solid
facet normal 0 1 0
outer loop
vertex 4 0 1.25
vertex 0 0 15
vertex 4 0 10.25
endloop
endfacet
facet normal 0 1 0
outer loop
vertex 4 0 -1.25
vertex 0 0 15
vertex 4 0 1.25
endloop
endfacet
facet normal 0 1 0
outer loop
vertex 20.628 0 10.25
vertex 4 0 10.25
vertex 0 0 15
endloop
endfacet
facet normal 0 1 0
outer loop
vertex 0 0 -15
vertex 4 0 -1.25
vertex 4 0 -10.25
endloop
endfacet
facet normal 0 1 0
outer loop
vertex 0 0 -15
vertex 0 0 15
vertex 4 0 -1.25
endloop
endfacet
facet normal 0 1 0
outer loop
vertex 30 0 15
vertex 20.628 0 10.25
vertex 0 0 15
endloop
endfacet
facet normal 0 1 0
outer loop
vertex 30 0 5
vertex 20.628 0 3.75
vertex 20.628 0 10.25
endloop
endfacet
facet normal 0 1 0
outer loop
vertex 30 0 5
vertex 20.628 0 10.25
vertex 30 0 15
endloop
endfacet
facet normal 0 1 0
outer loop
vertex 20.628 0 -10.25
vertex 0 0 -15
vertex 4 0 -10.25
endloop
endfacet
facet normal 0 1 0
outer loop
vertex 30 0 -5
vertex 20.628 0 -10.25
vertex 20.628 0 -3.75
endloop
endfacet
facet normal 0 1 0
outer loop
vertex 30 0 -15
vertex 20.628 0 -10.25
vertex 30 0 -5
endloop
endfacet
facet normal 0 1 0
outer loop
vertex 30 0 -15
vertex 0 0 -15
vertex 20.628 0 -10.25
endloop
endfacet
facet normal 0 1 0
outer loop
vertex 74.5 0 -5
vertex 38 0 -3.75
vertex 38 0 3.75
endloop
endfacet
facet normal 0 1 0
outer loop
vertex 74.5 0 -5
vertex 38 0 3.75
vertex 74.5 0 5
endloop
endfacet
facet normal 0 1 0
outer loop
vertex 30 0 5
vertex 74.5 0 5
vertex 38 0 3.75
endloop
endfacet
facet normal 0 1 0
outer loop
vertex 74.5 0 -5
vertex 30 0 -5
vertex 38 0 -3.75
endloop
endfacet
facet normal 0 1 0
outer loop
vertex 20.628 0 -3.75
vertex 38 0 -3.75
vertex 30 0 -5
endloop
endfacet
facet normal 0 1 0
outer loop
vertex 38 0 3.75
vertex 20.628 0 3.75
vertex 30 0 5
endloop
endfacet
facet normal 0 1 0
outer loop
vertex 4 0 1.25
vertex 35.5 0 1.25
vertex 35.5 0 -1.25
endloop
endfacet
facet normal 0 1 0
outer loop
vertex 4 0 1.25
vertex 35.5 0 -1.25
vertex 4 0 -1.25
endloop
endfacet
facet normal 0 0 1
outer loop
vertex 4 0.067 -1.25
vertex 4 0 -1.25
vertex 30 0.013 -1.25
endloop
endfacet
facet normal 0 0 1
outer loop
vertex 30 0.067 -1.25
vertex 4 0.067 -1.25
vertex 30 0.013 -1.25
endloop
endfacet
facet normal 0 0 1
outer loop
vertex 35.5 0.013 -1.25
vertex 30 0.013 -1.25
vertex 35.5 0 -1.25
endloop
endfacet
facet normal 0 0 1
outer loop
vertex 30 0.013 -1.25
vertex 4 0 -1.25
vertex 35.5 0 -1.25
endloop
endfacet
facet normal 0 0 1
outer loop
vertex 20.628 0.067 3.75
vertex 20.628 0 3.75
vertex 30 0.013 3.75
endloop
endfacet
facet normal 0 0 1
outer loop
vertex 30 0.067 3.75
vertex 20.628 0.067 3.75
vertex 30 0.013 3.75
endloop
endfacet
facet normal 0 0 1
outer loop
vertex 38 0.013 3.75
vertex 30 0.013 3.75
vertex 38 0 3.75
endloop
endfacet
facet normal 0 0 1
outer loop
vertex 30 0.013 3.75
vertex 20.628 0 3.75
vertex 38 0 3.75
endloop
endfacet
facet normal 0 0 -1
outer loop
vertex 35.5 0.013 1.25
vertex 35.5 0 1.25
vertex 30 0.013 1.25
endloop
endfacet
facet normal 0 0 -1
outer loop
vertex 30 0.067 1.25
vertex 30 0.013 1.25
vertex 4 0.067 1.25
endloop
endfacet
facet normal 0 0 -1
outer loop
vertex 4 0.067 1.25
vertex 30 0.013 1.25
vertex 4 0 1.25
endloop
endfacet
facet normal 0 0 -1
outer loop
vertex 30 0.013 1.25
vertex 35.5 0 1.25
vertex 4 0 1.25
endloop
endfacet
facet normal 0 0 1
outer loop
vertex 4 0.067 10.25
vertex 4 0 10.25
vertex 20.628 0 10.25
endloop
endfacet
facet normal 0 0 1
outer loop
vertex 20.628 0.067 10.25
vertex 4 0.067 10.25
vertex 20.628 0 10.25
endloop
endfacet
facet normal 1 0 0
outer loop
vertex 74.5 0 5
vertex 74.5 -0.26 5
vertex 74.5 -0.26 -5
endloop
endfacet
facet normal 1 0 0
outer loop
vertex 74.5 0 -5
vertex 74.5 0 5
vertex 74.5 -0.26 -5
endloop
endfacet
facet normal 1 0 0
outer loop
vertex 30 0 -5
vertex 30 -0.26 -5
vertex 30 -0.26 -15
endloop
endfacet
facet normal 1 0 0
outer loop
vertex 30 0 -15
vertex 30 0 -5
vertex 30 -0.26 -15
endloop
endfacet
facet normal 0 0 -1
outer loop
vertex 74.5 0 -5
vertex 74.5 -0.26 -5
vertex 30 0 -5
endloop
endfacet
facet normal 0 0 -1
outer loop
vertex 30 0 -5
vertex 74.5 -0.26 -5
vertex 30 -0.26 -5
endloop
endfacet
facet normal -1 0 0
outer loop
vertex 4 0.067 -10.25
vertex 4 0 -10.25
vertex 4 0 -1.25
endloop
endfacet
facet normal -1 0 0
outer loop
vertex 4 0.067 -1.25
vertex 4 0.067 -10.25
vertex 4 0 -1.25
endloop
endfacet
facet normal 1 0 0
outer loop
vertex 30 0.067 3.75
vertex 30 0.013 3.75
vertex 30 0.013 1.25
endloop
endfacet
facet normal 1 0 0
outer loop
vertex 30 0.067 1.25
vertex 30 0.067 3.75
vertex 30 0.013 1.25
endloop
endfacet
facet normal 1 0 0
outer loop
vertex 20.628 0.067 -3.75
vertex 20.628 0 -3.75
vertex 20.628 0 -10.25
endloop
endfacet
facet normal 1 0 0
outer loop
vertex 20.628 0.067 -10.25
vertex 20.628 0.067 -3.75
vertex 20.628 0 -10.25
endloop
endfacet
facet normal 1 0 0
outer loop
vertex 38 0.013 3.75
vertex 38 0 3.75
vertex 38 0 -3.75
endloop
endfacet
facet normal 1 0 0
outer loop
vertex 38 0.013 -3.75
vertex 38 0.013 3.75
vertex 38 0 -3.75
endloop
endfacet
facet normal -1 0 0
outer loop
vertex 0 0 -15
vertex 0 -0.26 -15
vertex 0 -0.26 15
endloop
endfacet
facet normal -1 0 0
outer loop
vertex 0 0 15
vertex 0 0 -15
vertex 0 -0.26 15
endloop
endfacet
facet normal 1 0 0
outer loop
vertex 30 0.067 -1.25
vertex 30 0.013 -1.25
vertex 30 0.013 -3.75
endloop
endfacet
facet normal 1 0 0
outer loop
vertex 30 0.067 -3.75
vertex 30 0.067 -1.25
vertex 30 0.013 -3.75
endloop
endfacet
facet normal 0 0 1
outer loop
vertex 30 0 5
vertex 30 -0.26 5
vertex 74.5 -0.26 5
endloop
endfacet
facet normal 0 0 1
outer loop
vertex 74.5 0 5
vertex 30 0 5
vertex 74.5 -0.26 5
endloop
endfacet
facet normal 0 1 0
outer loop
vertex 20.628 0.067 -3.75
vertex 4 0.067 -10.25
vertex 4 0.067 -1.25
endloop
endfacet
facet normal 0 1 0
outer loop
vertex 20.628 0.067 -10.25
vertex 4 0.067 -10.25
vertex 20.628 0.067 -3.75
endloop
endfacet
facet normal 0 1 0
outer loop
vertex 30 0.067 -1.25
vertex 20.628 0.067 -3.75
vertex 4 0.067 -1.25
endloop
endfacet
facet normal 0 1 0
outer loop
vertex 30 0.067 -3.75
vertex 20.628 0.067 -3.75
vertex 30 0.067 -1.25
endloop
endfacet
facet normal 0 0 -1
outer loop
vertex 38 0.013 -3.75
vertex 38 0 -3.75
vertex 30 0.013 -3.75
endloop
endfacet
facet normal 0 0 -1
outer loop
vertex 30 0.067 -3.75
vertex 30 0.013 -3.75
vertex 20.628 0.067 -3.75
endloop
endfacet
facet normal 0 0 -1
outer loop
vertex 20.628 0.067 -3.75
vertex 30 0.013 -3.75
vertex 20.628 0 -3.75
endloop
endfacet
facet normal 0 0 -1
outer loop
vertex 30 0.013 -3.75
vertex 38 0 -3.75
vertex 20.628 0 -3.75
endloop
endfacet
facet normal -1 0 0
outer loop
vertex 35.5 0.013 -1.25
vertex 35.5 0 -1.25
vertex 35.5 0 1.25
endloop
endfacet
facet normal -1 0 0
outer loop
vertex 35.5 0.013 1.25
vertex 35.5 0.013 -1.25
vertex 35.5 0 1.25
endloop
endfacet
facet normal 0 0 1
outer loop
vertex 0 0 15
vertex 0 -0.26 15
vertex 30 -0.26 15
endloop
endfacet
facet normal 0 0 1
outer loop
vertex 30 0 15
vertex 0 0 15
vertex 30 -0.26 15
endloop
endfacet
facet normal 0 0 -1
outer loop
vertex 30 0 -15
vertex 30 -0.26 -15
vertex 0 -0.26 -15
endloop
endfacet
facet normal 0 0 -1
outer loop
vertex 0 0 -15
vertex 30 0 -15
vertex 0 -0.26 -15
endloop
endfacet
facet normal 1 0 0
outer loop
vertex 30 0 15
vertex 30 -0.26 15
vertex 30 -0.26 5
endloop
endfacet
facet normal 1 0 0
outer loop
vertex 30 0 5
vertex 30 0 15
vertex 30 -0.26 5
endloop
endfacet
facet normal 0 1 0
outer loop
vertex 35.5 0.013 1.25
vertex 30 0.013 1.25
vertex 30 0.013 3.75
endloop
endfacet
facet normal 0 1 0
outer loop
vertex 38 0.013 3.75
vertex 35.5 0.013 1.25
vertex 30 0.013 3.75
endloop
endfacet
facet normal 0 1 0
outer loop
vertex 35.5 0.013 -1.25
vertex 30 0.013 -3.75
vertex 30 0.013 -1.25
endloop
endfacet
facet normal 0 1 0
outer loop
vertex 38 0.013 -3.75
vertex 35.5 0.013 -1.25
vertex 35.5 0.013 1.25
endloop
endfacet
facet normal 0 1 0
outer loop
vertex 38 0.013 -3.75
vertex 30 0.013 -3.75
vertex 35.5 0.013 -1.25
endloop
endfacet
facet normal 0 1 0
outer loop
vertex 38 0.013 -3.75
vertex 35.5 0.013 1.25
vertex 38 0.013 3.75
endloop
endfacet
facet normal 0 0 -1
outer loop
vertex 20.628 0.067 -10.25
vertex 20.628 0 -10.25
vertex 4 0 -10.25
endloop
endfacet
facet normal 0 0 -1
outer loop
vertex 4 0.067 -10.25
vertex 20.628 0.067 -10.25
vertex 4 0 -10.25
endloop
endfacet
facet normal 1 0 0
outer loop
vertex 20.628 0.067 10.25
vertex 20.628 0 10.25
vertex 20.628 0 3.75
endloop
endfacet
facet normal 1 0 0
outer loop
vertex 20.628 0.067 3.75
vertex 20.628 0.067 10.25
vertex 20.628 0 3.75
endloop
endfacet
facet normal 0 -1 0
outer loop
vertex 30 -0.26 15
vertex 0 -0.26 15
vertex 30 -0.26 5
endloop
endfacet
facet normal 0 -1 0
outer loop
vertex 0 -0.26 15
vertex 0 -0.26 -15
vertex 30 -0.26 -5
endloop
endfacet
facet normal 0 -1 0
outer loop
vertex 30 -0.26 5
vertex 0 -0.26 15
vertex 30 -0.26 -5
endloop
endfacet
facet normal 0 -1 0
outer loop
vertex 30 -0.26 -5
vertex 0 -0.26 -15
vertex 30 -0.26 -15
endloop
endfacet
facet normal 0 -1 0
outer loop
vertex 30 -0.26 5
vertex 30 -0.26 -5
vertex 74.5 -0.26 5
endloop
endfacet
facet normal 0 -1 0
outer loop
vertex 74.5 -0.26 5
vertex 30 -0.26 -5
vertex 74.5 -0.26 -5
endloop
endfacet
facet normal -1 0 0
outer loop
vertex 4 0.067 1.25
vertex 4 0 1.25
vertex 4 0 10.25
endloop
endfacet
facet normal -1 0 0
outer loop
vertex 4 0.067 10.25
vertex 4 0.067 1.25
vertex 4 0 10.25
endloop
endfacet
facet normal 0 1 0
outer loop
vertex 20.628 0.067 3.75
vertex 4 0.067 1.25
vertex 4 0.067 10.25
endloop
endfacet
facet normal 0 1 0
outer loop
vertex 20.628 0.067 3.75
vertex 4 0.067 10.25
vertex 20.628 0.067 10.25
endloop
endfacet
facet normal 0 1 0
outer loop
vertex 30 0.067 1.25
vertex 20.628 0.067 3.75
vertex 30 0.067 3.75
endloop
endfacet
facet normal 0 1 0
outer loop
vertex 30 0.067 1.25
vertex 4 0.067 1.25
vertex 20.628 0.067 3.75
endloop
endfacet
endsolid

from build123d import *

# Parameters (mm, degrees)
BOSS_EXTRUDE1_DEPTH      = 0.0001
BOSS_EXTRUDE1_DEPTH_BACK = 0.26
BOSS_EXTRUDE2_DEPTH      = 0.0126
BOSS_EXTRUDE3_DEPTH      = 0.0666


with BuildPart() as part:
    # Sketch1 → Boss-Extrude1 (new, two sides: drawn at the far end of the back side and taken through both)
    with BuildSketch(Plane(origin=(0, 0, 0), x_dir=(1, 0, 0), z_dir=(0, 1, 0)).offset(-BOSS_EXTRUDE1_DEPTH_BACK)):
        Polygon((0, -15), (30, -15), (30, -5), (74.5, -5), (74.5, 5), (30, 5), (30, 15), (0, 15), align=None)
    extrude(amount=BOSS_EXTRUDE1_DEPTH + BOSS_EXTRUDE1_DEPTH_BACK)

    # Sketch3 → Boss-Extrude2 (add)
    with BuildSketch(Plane(origin=(0, 0.0001, 0), x_dir=(1, 0, 0), z_dir=(0, 1, 0))):
        Polygon((30, 3.75), (30, 1.25), (35.5, 1.25), (35.5, -1.25), (30, -1.25), (30, -3.75), (38, -3.75), (38, 3.75), align=None)
    extrude(amount=BOSS_EXTRUDE2_DEPTH)

    # Sketch4 → Boss-Extrude3 (add)
    with BuildSketch(Plane(origin=(0, 0.0001, 0), x_dir=(1, 0, 0), z_dir=(0, 1, 0))):
        Polygon((4, 10.25), (4, 1.25), (30, 1.25), (30, 3.75), (20.627589053, 3.75), (20.627589053, 10.25), align=None)
        Polygon((30, -1.25), (4, -1.25), (4, -10.25), (20.627589053, -10.25), (20.627589053, -3.75), (30, -3.75), align=None)
    extrude(amount=BOSS_EXTRUDE3_DEPTH)


solid = part.part
